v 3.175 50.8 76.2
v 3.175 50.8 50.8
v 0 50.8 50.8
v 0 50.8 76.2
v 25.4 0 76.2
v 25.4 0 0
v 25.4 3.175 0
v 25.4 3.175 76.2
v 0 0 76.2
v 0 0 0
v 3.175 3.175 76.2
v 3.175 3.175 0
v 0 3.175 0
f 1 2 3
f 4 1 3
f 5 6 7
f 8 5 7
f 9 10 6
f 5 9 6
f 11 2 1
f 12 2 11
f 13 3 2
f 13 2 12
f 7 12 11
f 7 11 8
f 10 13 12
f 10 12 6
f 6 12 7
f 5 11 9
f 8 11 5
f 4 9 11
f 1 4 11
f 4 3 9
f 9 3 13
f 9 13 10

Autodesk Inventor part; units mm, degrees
ref_plane "YZ Plane" through (0, 0, 0) normal (1, 0, 0) x (0, 1, 0)
ref_plane "XZ Plane" through (0, 0, 0) normal (0, 1, 0) x (-1, 0, 0)
ref_plane "XY Plane" through (0, 0, 0) normal (0, 0, 1) x (1, 0, 0)
sketch "Sketch1" plane through (0, 0, 0) normal (0, 0, 1) x (1, 0, 0)
  line L0 (0, 0) -> (25.4, 0)
  line L1 (25.4, 0) -> (25.4, 3.175)
  line L2 (3.175, 50.8) -> (0, 50.8)
  line L3 (0, 50.8) -> (0, 0)
  line L4 (3.175, 50.8) -> (3.175, 3.175)
  line L5 (3.175, 3.175) -> (25.4, 3.175)
  dimension "d0" = 50.8
  dimension "d1" = 25.4
  dimension "d2" = 3.175
extrude "Extrusion1" add sketch "Sketch1" along normal blind 76.2
sketch "Sketch2" plane through (0, 0, 0) normal (-1, 0, 0) x (0, 0, 1)
  line L0 (76.2, 0) -> (76.2, 50.8) projected
  line L1 (0, 50.8) -> (76.2, 50.8) projected
  line L2 (0, 50.8) -> (0, 0) projected
  line L3 (0, 0) -> (76.2, 0) projected
  line L4 (50.8, 50.8) -> (50.8, 0) construction
  line L5 (50.8, 50.8) -> (0, 3.175)
  dimension "d5" = 25.4
  dimension "d6" = 3.175
extrude "Extrusion2" cut sketch "Sketch2" against normal blind 25.4 contours L5 L2 L1
properties part number "manipulator corner brace right"
